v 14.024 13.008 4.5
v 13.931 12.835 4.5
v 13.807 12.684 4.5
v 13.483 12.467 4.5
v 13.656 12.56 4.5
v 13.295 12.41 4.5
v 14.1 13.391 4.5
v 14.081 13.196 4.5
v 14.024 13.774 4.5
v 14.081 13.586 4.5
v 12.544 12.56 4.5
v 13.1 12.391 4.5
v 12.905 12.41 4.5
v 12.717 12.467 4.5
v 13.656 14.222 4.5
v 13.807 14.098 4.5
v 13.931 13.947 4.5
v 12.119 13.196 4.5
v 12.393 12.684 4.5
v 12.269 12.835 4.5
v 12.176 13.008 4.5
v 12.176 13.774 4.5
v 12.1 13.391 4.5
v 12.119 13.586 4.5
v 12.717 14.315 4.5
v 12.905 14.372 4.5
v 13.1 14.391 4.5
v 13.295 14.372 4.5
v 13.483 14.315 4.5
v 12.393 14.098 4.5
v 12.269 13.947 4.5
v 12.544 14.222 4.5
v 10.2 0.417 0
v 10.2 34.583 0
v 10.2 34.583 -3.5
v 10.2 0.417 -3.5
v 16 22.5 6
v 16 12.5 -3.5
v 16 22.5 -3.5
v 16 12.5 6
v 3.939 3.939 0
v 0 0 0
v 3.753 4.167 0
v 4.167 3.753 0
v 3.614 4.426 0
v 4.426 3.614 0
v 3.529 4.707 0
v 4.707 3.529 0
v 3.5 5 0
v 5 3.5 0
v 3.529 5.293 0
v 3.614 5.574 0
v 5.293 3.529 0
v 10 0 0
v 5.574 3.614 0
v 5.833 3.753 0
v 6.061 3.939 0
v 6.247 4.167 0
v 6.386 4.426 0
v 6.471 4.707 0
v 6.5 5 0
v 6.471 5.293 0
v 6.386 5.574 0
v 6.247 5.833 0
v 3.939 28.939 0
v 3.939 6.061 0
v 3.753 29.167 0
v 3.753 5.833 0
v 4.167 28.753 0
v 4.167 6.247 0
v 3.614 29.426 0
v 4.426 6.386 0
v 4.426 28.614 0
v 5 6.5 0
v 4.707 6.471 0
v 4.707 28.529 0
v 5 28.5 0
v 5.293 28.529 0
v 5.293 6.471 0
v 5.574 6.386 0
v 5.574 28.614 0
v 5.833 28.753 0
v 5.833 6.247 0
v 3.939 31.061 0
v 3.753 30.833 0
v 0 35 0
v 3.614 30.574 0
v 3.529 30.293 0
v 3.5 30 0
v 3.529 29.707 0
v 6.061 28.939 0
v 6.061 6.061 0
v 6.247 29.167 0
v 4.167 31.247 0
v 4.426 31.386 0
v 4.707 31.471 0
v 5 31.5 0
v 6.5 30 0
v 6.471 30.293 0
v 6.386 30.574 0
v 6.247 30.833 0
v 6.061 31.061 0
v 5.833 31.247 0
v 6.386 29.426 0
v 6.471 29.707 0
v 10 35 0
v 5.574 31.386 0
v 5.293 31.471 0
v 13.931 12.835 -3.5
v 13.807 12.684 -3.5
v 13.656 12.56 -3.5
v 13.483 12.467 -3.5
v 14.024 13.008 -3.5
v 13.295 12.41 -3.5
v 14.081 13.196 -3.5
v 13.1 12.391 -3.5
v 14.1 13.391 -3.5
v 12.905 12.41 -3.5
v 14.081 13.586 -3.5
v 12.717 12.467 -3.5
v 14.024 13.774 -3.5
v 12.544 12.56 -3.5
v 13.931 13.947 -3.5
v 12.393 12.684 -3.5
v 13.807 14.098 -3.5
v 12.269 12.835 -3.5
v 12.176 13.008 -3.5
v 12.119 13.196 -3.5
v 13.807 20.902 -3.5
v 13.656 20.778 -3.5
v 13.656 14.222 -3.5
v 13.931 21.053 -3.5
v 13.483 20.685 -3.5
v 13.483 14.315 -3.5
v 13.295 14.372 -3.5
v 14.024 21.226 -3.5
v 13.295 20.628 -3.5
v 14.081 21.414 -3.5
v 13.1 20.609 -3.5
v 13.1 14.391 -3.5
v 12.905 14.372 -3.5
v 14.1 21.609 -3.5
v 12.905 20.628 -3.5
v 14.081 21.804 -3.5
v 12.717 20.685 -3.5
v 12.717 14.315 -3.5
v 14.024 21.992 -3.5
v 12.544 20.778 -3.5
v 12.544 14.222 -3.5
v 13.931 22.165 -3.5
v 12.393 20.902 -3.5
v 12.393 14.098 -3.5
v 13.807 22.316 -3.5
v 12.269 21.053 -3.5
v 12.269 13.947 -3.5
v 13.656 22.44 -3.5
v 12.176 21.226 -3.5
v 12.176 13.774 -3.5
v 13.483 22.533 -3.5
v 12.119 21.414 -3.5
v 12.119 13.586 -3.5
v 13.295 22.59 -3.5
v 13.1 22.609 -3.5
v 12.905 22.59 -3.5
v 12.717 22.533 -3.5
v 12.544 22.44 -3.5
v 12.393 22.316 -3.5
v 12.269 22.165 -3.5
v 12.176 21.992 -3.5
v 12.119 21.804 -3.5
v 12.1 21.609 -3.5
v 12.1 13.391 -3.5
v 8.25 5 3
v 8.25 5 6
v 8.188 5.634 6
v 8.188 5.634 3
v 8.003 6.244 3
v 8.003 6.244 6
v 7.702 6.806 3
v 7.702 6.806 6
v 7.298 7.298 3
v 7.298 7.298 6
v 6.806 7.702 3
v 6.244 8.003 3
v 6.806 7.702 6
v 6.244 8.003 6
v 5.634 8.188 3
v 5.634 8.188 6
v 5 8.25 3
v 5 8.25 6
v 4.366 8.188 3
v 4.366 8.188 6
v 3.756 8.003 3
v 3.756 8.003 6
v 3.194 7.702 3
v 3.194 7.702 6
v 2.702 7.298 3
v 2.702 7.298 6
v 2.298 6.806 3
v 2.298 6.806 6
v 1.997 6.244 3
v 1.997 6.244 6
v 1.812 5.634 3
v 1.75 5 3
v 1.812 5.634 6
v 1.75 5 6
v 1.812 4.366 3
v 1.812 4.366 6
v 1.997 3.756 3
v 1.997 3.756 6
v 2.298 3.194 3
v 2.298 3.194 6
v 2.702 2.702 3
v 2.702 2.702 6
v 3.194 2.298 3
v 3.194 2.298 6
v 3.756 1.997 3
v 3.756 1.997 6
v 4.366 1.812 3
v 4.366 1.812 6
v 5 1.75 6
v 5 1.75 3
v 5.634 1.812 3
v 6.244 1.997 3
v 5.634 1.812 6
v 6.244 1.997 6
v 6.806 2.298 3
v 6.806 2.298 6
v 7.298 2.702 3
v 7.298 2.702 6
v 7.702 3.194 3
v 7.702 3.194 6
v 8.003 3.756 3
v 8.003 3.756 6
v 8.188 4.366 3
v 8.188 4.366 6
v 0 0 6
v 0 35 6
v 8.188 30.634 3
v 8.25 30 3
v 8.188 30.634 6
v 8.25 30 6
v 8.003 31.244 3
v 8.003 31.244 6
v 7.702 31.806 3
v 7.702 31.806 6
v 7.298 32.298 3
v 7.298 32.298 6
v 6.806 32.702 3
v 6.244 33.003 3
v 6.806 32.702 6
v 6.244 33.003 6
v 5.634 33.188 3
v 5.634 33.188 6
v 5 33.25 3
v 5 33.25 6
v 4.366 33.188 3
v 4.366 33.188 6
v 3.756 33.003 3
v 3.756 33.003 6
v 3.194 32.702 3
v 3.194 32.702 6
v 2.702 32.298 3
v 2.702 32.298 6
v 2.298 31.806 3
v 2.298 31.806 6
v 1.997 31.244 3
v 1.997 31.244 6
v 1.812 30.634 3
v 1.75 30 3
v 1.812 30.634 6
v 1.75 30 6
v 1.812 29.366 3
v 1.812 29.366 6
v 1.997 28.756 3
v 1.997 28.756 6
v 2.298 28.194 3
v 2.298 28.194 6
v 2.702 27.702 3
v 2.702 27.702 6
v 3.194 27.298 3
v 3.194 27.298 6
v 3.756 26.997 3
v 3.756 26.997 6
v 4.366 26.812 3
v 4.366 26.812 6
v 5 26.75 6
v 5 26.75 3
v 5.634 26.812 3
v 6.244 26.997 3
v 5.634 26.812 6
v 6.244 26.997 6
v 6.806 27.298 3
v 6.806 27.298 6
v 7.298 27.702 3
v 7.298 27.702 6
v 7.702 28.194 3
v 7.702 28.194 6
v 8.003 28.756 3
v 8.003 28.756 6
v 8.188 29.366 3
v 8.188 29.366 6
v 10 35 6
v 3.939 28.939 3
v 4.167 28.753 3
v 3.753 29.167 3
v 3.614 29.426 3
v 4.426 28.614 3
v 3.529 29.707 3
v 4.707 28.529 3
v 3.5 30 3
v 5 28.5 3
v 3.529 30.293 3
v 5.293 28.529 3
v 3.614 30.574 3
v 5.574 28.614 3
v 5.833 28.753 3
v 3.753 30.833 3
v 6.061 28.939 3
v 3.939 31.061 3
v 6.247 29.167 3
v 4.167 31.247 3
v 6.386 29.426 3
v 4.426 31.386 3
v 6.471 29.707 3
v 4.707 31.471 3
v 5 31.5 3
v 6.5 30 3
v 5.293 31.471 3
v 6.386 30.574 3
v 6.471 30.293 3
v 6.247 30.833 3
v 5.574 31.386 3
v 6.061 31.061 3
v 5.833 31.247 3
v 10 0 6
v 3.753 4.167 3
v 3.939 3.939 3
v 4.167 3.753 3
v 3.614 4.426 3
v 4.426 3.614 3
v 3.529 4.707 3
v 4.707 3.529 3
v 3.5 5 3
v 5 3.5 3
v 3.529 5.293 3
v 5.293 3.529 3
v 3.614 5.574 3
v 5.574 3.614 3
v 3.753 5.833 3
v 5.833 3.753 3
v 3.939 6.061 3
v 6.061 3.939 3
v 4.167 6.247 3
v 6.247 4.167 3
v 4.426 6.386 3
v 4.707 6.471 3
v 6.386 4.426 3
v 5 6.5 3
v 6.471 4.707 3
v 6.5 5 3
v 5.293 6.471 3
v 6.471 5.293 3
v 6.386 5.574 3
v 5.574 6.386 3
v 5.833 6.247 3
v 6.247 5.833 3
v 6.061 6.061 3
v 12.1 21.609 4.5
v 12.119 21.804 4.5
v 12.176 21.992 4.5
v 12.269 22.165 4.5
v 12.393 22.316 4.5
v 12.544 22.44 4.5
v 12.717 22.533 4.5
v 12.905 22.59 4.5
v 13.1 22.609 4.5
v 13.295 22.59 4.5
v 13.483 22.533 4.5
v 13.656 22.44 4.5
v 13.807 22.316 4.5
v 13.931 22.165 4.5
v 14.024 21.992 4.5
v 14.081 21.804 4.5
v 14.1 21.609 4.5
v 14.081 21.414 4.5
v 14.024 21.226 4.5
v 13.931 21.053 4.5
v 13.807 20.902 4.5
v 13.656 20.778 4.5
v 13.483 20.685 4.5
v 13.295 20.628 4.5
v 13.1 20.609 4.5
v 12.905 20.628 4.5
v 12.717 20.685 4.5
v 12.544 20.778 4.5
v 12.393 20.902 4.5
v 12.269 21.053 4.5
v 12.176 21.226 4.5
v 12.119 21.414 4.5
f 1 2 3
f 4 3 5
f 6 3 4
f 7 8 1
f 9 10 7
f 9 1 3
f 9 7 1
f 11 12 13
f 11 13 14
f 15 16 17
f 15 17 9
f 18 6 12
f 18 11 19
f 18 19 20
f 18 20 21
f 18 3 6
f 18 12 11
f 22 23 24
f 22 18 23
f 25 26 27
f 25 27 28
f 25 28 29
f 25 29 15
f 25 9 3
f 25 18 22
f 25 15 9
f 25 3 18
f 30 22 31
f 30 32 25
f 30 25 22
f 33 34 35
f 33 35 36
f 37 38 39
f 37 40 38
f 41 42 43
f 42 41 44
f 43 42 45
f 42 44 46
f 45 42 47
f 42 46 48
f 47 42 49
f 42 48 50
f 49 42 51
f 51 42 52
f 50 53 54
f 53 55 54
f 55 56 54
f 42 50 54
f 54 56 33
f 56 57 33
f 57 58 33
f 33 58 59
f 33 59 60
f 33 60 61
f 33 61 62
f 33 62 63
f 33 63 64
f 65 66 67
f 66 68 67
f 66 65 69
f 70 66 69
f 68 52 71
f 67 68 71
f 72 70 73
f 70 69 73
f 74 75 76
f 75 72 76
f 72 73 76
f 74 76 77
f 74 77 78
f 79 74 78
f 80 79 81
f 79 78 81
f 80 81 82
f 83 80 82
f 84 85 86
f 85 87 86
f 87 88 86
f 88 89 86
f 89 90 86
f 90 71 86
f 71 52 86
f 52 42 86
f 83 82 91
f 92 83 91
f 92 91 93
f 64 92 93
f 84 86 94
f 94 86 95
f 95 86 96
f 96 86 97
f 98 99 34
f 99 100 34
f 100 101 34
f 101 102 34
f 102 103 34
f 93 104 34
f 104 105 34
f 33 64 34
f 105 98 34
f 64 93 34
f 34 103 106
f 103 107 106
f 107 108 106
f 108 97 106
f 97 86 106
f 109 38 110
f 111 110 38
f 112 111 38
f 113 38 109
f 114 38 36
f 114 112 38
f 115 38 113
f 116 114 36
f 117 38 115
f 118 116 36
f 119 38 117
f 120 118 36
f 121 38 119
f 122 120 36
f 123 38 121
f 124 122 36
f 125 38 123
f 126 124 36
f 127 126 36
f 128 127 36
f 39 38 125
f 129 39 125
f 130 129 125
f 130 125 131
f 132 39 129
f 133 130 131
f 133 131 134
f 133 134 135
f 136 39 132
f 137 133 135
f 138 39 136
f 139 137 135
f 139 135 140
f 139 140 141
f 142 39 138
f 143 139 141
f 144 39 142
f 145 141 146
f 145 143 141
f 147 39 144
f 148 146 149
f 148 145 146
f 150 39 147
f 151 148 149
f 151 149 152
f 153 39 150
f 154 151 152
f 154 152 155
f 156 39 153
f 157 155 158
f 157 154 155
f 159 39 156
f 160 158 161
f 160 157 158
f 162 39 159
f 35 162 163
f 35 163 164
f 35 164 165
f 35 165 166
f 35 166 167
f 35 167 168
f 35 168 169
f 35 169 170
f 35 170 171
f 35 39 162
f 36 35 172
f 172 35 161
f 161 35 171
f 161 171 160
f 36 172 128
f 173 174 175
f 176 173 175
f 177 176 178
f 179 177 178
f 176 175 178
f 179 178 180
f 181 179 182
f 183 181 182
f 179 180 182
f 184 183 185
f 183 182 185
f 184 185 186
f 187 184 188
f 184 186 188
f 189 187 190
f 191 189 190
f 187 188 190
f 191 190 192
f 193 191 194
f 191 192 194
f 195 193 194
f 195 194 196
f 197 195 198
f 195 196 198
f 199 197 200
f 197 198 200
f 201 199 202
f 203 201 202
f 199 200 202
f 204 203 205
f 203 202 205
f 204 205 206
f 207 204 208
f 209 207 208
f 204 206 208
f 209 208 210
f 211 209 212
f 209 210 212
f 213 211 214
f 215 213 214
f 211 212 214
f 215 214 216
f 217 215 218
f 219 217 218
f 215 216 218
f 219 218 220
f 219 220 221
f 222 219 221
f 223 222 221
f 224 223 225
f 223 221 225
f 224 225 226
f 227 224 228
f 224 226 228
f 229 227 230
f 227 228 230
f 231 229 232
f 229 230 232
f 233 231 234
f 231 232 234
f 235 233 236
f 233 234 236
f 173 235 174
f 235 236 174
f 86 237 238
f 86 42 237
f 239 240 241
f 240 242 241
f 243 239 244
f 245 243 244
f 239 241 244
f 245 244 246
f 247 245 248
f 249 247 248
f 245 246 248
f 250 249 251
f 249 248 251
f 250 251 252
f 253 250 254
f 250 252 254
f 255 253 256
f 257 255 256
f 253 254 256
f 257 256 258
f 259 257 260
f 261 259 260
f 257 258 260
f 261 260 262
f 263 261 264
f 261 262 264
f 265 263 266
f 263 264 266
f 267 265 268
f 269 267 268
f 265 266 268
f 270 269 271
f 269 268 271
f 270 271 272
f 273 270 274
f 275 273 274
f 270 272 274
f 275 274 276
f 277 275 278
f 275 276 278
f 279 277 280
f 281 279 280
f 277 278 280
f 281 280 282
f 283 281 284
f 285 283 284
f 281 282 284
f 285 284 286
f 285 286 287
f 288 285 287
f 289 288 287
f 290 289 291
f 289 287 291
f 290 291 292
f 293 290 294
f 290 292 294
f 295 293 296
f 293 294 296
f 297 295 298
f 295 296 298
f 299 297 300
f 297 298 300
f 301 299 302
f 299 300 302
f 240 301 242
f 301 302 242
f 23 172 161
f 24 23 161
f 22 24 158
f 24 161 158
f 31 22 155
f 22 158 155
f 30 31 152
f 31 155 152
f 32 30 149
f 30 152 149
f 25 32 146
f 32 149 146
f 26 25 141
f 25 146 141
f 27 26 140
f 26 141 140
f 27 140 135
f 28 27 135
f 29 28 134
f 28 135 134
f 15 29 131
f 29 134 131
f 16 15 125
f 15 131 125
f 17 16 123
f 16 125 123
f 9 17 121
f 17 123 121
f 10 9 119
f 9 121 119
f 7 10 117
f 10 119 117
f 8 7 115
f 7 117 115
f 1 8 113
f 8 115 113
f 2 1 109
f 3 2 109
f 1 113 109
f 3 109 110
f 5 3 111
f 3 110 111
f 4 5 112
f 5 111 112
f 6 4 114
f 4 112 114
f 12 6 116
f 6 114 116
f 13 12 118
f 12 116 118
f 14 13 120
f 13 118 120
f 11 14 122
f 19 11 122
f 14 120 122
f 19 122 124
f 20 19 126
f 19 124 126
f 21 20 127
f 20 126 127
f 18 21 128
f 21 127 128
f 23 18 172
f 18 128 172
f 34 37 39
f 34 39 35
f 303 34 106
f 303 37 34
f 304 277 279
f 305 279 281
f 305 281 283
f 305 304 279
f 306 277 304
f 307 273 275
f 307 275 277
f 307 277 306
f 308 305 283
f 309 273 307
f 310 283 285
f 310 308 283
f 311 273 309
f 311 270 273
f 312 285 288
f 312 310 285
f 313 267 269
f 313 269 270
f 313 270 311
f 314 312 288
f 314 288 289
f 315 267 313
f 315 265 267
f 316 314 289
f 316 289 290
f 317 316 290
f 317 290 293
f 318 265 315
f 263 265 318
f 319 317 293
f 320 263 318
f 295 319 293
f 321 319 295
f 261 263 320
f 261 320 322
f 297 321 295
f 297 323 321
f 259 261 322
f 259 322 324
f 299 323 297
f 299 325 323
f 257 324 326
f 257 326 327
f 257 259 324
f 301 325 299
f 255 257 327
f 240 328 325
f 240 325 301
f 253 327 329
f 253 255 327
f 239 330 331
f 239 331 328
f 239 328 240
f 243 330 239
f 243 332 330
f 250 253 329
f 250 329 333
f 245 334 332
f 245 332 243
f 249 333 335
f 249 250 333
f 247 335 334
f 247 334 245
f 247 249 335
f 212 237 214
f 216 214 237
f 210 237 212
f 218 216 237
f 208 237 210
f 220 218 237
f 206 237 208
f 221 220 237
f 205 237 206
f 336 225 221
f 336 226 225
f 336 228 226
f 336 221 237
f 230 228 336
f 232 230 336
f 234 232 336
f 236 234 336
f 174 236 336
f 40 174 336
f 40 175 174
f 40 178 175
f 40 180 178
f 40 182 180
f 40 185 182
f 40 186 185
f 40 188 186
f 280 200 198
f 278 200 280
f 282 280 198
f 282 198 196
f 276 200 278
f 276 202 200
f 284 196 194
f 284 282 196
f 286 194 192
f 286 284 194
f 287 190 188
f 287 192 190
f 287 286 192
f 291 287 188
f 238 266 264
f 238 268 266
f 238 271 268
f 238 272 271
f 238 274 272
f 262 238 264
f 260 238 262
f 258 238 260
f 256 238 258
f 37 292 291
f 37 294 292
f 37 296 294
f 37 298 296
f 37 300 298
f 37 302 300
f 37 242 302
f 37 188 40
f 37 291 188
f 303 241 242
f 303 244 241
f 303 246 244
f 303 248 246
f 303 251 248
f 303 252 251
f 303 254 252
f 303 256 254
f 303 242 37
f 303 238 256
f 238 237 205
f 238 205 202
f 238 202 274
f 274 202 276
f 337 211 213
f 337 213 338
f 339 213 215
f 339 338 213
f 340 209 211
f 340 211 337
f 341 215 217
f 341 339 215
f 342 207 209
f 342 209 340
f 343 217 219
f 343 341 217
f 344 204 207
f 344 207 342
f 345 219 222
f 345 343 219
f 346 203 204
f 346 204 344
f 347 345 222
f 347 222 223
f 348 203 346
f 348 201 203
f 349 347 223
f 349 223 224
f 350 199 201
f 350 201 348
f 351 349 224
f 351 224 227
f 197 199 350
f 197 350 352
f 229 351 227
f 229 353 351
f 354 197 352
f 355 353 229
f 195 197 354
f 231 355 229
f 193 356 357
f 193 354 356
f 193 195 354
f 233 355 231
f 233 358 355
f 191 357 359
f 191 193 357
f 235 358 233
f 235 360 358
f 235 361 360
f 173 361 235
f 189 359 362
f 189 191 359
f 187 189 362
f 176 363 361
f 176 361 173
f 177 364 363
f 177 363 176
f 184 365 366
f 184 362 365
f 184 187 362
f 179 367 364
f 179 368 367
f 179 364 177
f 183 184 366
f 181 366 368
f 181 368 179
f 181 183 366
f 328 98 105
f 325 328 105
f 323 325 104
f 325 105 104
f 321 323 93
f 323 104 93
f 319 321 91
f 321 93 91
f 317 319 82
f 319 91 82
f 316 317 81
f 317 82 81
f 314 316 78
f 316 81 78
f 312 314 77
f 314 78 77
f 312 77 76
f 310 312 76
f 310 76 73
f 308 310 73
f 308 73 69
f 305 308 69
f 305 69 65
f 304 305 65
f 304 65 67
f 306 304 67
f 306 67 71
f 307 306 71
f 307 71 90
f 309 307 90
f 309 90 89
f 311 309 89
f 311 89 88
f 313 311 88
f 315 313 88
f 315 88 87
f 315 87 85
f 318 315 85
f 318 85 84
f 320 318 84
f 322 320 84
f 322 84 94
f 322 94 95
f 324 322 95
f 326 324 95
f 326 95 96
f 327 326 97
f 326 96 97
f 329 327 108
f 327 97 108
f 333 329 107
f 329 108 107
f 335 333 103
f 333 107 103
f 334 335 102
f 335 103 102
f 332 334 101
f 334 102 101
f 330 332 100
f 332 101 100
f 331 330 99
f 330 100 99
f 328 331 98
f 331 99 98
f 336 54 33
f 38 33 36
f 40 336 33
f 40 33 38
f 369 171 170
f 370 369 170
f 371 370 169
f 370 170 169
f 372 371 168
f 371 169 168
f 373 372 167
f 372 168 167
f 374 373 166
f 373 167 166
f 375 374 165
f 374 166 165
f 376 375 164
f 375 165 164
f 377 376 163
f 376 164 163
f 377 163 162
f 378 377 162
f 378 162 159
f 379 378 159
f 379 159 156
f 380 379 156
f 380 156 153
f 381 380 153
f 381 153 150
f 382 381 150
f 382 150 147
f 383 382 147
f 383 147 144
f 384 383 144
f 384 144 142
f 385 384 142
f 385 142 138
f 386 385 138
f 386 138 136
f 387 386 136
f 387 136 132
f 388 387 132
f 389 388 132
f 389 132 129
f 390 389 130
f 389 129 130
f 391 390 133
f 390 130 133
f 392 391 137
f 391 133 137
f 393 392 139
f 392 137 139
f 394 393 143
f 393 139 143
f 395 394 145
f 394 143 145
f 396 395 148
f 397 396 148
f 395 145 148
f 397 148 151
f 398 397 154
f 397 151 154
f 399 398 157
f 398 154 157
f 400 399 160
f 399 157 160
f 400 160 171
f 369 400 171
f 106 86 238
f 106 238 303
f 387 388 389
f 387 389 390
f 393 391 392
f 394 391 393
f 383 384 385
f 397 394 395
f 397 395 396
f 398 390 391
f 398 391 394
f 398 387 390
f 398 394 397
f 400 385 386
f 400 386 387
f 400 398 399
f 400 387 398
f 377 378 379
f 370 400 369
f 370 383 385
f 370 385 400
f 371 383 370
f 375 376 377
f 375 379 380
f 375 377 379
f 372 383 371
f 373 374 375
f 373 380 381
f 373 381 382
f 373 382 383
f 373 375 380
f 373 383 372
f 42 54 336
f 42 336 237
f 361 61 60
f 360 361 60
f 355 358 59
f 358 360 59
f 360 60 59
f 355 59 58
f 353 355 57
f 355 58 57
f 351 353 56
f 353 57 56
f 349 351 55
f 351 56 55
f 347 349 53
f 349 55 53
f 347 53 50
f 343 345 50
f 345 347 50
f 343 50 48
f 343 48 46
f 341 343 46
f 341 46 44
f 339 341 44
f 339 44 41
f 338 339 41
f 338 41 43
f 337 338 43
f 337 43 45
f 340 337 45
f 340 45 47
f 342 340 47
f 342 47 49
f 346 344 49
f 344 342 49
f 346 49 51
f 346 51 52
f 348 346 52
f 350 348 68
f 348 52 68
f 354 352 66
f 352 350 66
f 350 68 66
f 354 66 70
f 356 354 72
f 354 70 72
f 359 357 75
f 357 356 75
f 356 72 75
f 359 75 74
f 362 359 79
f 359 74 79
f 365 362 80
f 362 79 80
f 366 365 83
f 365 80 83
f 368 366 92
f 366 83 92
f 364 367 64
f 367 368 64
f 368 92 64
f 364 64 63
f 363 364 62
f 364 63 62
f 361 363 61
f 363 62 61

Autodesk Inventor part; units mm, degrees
ref_plane "YZ Plane" through (0, 0, 0) normal (1, 0, 0) x (0, 1, 0)
ref_plane "XZ Plane" through (0, 0, 0) normal (0, 1, 0) x (-1, 0, 0)
ref_plane "XY Plane" through (0, 0, 0) normal (0, 0, 1) x (1, 0, 0)
sketch "Sketch1" plane through (0, 0, 0) normal (0, 0, 1) x (1, 0, 0)
  line L0 (0, 0) -> (0, 5)
  line L1 (0, 5) -> (0, 30)
  line L2 (0, 30) -> (0, 35)
  line L3 (0, 35) -> (10, 35)
  line L4 (10, 35) -> (10, 0)
  line L5 (10, 0) -> (0, 0)
  line L6 (0, 35) -> (5, 35)
  line L7 (5, 35) -> (5, 0)
  circle A0 centre (5, 30) radius 1.5
  circle A1 centre (5, 5) radius 1.5
  line L8 (5, 17.5) -> (10, 17.5)
  line L9 (10, 17.5) -> (16, 17.5)
  line L10 (16, 17.5) -> (16, 12.5)
  line L11 (16, 17.5) -> (16, 22.5)
  line L12 (16, 22.5) -> (10, 35)
  line L13 (16, 12.5) -> (10, 0)
  dimension "d0" = 5
  dimension "d1" = 25
  dimension "d2" = 5
  dimension "d3" = 10
  dimension "d4" = 5
  dimension "d5" = 3
  dimension "d6" = 3
  dimension "d7" = 6
  dimension "d8" = 5
  dimension "d9" = 5
extrude "Extrusion1" add sketch "Sketch1" along normal blind 6 contours L0 L1 L2 L3 L7 A0 A1 L5 | L7 A1 L8 L4 L5 | L4 L9 L10 L13 | L8 L7 A0 L3 L4 | L4 L12 L11 L9
sketch "Sketch2" plane through (0, 0, 0) normal (0, 0, -1) x (-1, 0, 0)
  line L0 (0, 35) -> (0, 0) projected
  line L1 (-10, 35) -> (0, 35) projected
  line L2 (-16, 22.5) -> (-10, 35) projected
  line L3 (-16, 12.5) -> (-16, 22.5) projected
  line L4 (-10, 0) -> (-16, 12.5) projected
  line L5 (0, 0) -> (-10, 0) projected
  circle A0 centre (-5, 30) radius 1.5 projected
  circle A1 centre (-5, 5) radius 1.5 projected
  line L6 (-10, 0) -> (-16, 12.5) projected
  line L7 (-10, 35) -> (-10, 0)
  line L8 (-10, 0) -> (-16, 12.5)
  line L9 (-16, 12.5) -> (-16, 22.5)
  line L10 (-10, 35) -> (-16, 22.5)
  line L11 (-10.2, 34.5833) -> (-10.2, 0.4167)
  point P0 (-10.2, 0.4167)
  dimension "d54" = 0.2
extrude "Extrusion2" add sketch "Sketch2" along normal blind 3.5 contours L11 L4 L3 L2
sketch "Sketch3" plane through (0, 0, 6) normal (0, 0, 1) x (1, 0, 0)
  line L0 (0, 35) -> (0, 0) projected
  line L1 (0, 0) -> (10, 0) projected
  line L2 (10, 0) -> (16, 12.5) projected
  line L3 (16, 12.5) -> (16, 22.5) projected
  line L4 (16, 22.5) -> (10, 35) projected
  line L5 (10, 35) -> (0, 35) projected
  circle A0 centre (5, 30) radius 1.5 projected
  circle A1 centre (5, 5) radius 1.5 projected
  circle A2 centre (5, 30) radius 3.25
  circle A3 centre (5, 5) radius 3.25
  dimension "d14" = 6.5
  dimension "d17" = 6.5
extrude "Extrusion3" cut sketch "Sketch3" against normal blind 3 contours A0 | A2 | A3
sketch "Sketch4" plane through (0, 0, -3.5) normal (0, 0, -1) x (-1, 0, 0)
  line L0 (-10.2, 34.5833) -> (-16, 22.5) projected
  line L1 (-16, 22.5) -> (-16, 12.5) projected
  line L2 (-16, 12.5) -> (-10.2, 0.4167) projected
  line L3 (0, 0) -> (-10, 0) projected
  line L4 (0, 35) -> (0, 0) projected
  line L5 (-10, 35) -> (0, 35) projected
  circle A0 centre (-5, 30) radius 1.5 projected
  circle A1 centre (-5, 5) radius 1.5 projected
  line L6 (-15.8046, 22.9071) -> (-13.1, 21.609)
  line L7 (-15.8046, 12.0929) -> (-13.1, 13.391)
  circle A2 centre (-13.1, 13.391) radius 1
  circle A3 centre (-13.1, 21.609) radius 1
  line L8 (-10.2, 34.5833) -> (-10.2, 0.4167) projected
  line L9 (-10, 0) -> (-10.2, 0.4167) projected
  line L10 (-10.2, 34.5833) -> (-10, 35) projected
  line L11 (-10.2, 0.4167) -> (-10.2, 34.5833) projected
  dimension "d39" = 3
  dimension "d41" = 90
  dimension "d42" = 3
  dimension "d43" = 90
  dimension "d45" = 2.9
  dimension "d46" = 2
  dimension "d47" = 2
  dimension "d52" = 8.2179
  dimension "d55" = 2.9
  dimension "d56" = 0.2
  dimension "d57" = 6
extrude "Extrusion4" cut sketch "Sketch4" against normal blind 8 contours A3 | A2
equation "\"d2\" = d0"
equation "\"d4\" = 0.5 * d3"
equation "\"d9\" = d8"
equation "\"d39\" = 0.5 * d36"
equation "\"d42\" = d39"
equation "\"d45\" = d55"
equation "\"d55\" = -0.5 * d56 + 0.5 * d57"
equation "\"d36\" = 6"
properties part number "Clamp"
